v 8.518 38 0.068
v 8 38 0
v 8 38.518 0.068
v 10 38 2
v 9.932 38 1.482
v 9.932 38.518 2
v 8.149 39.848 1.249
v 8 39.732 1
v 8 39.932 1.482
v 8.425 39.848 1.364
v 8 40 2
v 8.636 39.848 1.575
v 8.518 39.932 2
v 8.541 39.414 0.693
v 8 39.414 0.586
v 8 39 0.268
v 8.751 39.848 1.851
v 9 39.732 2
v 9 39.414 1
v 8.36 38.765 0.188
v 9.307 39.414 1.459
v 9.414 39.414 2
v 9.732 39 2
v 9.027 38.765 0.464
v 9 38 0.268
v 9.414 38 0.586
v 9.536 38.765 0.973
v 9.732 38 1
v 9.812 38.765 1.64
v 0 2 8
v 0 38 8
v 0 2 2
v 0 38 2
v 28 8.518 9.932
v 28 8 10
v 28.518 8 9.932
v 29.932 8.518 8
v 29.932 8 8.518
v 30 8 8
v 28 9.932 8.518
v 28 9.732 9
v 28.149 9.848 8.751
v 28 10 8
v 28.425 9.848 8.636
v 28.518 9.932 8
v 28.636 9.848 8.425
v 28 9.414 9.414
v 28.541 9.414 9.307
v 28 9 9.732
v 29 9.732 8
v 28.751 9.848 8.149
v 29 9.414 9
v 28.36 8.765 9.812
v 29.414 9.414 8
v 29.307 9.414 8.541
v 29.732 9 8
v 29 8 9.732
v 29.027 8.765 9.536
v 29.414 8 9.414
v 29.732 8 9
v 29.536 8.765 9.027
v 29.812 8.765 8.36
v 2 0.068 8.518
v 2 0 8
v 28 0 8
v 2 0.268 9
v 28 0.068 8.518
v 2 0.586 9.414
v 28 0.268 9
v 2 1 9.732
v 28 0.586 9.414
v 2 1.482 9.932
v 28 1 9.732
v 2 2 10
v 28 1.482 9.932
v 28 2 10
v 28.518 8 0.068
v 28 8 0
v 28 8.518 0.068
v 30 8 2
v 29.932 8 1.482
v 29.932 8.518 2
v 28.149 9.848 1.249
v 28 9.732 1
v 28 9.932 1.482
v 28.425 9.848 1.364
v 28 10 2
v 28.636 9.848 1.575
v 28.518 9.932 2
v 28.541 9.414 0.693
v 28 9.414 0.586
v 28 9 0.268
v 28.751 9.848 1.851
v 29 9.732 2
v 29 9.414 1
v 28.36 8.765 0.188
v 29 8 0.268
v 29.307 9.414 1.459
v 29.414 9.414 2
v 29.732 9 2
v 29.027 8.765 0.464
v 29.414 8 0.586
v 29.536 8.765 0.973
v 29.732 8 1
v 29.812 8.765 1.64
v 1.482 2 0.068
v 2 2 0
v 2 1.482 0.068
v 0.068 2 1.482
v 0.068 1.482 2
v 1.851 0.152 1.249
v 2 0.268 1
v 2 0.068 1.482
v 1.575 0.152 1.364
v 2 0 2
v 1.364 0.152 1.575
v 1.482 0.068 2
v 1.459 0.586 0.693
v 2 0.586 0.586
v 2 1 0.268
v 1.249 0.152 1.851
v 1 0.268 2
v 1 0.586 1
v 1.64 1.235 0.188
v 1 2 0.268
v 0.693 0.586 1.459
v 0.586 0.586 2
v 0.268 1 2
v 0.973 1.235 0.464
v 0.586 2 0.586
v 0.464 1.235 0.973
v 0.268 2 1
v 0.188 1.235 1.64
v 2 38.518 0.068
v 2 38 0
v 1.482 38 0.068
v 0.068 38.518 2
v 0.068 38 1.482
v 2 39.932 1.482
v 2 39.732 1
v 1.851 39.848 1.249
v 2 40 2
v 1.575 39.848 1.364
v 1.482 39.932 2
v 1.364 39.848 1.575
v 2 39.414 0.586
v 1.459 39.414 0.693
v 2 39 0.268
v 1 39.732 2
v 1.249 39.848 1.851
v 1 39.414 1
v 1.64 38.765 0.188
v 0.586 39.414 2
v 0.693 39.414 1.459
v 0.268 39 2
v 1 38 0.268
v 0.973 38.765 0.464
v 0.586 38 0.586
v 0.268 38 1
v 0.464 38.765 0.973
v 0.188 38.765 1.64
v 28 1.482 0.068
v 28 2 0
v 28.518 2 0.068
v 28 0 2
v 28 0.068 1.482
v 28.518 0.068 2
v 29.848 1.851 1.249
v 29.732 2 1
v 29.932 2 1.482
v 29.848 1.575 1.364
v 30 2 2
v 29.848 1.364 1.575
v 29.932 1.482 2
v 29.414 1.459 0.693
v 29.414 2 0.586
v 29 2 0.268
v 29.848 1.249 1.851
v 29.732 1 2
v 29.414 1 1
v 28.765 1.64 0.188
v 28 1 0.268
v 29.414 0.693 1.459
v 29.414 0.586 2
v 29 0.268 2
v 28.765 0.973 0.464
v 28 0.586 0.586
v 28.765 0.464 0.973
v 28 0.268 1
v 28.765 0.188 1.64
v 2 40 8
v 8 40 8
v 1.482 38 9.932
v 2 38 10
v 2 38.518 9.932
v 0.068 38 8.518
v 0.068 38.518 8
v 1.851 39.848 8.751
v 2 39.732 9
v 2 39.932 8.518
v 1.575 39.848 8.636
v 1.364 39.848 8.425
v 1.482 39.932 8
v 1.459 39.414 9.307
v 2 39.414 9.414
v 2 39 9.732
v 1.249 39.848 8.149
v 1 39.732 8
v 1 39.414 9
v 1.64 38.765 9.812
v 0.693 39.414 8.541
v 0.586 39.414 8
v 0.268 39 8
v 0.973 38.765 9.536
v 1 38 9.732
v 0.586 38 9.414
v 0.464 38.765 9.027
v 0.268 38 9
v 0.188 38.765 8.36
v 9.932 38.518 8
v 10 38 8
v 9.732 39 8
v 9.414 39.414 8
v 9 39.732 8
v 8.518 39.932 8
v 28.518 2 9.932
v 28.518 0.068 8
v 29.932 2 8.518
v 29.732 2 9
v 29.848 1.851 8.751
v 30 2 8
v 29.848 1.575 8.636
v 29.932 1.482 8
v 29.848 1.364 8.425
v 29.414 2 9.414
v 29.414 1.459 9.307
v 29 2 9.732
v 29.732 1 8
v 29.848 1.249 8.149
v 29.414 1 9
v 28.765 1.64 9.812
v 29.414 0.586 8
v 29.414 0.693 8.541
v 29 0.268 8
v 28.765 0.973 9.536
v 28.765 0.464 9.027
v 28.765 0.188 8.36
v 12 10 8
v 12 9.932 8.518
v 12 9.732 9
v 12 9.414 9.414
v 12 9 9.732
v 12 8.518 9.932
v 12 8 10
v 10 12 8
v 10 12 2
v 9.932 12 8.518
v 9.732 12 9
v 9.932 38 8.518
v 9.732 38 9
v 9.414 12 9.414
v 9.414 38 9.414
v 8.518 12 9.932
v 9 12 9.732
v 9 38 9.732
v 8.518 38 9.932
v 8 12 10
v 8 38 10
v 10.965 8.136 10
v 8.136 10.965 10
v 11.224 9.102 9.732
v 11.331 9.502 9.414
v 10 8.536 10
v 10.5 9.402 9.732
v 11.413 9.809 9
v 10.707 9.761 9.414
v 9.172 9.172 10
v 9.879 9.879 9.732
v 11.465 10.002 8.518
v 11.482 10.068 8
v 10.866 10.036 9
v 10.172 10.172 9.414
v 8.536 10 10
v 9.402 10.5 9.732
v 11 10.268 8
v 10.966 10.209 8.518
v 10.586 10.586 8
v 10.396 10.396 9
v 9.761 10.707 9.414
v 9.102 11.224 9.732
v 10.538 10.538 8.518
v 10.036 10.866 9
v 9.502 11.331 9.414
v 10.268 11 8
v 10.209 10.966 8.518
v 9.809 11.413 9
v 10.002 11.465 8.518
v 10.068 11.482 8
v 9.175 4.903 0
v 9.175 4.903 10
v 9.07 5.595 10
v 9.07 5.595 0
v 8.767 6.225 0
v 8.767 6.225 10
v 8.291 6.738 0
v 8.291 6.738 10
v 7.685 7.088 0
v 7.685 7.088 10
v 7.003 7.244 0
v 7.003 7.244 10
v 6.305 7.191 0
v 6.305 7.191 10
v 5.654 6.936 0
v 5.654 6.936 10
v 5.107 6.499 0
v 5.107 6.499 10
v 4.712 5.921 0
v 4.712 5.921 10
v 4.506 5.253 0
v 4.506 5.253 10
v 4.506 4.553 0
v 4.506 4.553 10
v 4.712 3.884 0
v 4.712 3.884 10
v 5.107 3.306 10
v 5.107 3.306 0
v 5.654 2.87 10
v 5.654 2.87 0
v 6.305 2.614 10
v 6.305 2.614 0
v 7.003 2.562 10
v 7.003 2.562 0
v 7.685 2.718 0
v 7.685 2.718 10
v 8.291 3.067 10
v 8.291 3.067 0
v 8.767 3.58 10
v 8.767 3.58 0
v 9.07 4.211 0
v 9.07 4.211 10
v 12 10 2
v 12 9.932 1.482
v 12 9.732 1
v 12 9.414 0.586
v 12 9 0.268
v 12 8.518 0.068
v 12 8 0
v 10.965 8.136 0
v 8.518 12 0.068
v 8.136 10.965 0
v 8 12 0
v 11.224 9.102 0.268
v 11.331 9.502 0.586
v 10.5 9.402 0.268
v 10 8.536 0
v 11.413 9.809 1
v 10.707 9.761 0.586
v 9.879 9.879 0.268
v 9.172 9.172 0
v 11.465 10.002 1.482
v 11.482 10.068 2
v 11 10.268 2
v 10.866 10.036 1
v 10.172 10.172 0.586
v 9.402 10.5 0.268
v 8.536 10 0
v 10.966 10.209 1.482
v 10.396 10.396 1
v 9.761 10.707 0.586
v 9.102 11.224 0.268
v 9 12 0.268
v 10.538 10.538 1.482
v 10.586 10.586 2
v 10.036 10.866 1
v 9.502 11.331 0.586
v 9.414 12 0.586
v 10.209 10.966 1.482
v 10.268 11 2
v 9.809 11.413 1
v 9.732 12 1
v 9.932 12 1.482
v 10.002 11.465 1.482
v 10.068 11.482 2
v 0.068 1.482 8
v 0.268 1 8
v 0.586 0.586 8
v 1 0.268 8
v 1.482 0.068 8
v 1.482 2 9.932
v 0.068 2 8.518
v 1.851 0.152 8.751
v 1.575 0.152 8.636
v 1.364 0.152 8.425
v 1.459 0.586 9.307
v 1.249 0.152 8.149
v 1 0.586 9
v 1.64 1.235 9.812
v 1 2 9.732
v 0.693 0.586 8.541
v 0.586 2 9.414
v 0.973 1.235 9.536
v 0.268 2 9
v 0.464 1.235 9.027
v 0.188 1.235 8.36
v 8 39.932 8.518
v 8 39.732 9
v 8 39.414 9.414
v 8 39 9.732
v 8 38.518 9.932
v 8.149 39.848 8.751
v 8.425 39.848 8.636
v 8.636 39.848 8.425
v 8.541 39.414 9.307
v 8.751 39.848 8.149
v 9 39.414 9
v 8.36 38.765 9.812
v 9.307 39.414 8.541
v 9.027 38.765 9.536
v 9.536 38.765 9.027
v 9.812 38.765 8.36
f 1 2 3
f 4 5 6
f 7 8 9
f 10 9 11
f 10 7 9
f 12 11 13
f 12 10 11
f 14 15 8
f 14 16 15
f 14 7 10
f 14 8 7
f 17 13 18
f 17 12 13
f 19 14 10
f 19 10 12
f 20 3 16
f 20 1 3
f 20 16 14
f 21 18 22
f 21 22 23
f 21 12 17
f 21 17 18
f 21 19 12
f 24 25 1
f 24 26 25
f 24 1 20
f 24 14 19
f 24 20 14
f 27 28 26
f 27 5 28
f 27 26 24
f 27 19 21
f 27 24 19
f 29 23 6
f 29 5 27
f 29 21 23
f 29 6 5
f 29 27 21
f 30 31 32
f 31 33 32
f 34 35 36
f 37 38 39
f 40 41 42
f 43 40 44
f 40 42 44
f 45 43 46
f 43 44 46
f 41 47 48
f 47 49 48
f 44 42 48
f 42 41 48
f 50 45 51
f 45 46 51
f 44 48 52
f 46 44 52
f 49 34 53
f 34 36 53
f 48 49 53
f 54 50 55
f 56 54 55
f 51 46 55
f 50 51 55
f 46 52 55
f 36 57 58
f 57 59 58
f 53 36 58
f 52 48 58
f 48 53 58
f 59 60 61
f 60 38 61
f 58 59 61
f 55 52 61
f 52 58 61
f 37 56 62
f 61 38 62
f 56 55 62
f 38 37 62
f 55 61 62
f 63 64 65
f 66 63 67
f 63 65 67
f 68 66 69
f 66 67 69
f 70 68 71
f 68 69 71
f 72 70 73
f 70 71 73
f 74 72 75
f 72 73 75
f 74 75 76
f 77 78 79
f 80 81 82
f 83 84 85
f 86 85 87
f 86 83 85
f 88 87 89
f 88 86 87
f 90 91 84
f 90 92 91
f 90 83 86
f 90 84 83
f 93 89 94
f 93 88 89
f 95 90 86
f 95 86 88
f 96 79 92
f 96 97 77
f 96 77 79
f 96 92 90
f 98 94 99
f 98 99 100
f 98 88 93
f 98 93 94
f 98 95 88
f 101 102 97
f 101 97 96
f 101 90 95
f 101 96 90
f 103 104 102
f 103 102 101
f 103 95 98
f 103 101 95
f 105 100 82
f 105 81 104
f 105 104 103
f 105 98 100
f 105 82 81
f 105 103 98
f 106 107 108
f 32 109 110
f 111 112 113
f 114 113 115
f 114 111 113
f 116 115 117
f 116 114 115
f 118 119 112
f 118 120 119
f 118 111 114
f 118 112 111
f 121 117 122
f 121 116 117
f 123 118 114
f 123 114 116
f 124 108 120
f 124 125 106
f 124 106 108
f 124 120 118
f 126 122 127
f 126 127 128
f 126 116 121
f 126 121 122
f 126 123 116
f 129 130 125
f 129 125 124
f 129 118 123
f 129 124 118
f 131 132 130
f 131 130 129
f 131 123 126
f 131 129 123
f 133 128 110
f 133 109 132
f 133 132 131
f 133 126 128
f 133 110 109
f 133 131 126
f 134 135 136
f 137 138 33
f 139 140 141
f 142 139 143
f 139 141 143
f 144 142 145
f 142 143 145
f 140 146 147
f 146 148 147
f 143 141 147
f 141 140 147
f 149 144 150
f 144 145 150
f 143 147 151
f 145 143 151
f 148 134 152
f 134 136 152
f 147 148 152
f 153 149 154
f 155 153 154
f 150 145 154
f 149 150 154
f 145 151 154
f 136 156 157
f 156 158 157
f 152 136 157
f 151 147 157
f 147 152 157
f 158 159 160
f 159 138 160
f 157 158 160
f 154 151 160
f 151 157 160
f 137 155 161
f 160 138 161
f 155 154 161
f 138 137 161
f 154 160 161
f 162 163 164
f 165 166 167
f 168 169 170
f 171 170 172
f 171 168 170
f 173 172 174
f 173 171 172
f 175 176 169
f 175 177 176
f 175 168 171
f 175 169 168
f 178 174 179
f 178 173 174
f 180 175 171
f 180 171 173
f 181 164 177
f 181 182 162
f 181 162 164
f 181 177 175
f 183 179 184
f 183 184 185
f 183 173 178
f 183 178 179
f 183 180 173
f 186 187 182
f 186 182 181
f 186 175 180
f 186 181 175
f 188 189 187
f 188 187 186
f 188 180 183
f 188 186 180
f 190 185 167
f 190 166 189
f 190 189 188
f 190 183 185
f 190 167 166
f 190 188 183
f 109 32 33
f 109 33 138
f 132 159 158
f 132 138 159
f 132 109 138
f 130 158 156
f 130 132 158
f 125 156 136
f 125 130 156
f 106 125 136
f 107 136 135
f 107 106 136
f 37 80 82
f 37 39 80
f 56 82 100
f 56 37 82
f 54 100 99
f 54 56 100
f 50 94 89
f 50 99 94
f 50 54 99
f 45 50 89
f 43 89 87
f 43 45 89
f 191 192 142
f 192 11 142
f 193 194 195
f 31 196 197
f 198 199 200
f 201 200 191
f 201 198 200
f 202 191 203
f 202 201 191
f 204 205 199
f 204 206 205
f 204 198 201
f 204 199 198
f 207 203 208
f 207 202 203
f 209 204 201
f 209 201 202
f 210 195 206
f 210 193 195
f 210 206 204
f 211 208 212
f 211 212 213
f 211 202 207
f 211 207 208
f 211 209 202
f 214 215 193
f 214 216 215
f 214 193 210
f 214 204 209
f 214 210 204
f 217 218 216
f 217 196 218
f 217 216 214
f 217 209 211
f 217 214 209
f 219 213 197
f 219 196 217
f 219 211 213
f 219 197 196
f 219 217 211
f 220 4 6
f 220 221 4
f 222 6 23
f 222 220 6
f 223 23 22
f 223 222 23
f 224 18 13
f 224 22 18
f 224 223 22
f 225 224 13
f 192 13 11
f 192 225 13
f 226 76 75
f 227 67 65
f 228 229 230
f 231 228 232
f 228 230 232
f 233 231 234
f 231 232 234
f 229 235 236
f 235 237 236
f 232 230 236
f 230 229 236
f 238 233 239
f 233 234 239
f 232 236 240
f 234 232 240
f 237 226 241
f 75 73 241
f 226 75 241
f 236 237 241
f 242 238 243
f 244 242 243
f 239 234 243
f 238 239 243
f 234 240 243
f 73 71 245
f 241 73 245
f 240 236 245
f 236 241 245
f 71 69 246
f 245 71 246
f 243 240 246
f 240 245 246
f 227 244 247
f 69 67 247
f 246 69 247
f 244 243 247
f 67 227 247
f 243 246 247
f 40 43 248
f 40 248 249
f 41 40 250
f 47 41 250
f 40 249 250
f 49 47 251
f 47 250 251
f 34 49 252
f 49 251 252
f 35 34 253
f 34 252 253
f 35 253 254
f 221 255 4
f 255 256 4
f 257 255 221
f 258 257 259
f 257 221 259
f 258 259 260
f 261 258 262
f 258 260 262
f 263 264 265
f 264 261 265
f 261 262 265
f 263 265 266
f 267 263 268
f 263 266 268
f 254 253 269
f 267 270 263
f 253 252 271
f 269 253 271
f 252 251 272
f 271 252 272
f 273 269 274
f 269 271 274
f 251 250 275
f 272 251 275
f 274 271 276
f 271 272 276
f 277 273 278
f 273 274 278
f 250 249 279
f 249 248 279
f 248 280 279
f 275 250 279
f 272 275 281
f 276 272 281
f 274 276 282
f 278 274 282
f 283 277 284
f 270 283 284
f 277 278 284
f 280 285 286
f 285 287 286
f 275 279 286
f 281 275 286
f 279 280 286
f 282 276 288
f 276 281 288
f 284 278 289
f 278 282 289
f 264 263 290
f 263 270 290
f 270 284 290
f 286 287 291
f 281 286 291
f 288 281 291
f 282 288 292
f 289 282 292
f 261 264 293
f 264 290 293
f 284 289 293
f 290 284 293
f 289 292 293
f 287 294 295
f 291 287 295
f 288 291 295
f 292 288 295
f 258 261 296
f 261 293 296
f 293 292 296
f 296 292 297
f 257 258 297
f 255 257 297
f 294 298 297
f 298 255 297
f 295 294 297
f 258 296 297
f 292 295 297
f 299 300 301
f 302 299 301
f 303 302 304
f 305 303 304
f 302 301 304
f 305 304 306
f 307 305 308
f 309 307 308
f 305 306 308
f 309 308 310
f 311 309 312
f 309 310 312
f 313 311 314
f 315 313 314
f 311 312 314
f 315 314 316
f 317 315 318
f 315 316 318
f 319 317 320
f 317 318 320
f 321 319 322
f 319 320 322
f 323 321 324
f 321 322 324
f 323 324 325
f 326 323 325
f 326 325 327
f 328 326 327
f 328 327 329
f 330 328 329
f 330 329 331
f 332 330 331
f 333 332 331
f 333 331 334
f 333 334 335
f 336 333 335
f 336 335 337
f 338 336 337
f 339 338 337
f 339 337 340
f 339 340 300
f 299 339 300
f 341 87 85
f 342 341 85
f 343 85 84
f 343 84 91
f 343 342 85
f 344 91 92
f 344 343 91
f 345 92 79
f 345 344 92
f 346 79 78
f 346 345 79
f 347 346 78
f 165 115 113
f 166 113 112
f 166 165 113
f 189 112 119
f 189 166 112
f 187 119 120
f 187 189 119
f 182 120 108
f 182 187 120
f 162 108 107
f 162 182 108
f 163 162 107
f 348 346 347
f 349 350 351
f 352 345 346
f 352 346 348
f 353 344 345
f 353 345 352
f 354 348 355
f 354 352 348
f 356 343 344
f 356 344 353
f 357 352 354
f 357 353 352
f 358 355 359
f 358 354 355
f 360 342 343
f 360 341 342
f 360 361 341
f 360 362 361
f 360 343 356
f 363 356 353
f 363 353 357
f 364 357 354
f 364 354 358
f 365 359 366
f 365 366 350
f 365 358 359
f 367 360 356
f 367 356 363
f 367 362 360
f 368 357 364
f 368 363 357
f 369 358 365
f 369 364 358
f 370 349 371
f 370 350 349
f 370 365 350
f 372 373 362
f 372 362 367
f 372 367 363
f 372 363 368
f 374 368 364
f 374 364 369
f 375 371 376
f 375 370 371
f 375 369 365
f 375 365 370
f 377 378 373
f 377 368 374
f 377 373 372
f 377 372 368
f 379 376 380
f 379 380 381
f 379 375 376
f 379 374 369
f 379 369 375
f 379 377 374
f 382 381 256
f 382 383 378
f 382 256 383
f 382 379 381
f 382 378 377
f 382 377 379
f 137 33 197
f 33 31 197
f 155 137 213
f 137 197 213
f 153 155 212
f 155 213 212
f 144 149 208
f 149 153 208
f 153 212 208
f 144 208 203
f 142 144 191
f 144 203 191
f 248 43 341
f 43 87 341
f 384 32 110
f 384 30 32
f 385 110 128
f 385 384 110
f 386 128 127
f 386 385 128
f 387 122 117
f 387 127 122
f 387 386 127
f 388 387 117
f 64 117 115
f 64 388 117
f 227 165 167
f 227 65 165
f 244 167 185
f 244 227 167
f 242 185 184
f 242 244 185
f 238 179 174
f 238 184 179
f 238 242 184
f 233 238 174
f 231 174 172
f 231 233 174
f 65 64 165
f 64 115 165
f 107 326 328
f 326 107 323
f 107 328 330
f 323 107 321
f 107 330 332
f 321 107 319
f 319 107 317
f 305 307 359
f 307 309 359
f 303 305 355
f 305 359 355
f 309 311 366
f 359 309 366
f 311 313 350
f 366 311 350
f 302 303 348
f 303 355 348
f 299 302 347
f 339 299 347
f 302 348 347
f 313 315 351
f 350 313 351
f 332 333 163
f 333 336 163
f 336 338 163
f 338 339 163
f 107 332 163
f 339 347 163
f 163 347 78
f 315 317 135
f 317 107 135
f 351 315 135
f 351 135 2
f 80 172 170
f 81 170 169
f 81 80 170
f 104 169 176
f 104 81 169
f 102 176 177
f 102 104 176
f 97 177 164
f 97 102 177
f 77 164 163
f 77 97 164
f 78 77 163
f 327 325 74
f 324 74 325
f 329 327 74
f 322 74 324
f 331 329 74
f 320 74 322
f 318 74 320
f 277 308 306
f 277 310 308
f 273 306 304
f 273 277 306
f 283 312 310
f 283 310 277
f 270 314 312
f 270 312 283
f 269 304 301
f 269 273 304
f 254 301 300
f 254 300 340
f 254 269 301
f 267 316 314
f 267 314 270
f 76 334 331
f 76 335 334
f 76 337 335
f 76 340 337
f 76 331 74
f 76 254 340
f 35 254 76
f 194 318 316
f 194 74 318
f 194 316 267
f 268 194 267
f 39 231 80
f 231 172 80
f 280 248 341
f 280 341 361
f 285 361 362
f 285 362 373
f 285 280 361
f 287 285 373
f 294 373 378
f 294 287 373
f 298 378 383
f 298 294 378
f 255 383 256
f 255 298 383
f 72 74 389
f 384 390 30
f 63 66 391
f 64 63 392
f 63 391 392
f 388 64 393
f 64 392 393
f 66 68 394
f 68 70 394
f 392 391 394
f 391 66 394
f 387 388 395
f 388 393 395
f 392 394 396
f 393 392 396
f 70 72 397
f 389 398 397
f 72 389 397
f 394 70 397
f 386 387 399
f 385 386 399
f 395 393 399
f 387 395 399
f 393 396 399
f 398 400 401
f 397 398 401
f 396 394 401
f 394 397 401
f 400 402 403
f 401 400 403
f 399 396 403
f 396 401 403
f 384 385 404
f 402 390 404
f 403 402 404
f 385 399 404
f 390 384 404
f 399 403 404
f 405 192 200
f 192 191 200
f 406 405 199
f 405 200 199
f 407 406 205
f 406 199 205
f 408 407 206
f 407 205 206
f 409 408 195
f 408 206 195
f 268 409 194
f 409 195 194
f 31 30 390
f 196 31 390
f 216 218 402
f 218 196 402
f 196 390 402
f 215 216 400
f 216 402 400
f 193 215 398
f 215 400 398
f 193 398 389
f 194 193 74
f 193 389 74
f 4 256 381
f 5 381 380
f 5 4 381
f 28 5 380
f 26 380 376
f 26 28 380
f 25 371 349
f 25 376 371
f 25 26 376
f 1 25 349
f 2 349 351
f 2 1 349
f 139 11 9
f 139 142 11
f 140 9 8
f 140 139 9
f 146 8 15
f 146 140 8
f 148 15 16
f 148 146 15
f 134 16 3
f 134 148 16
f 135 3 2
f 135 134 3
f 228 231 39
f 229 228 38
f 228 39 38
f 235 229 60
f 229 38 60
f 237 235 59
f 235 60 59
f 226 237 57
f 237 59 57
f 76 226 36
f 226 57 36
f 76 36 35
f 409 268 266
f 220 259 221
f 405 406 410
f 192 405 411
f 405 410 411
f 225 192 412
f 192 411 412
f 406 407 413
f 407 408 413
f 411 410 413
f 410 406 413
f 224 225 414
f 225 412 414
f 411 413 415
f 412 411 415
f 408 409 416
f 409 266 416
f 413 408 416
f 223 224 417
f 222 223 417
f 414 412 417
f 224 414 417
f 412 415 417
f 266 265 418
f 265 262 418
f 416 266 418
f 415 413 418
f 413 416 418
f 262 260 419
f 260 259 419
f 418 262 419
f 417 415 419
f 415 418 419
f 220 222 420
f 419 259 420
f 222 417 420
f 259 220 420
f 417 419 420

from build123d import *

# Parameters (mm, degrees)
F1_DEPTH = 10
F2_R     = 2
F3_R     = 2.3474
F4_DEPTH = 25


with BuildPart() as f1:
    # F0 (on Top) → F1 (new body)
    with BuildSketch(Plane.XY):
        Polygon((0, 40), (0, 0), (30, 0), (30, 10), (10, 10), (10, 40), align=None)
    extrude(amount=F1_DEPTH)

    # F2
    f2_edges = [f1.edges().sort_by_distance(p)[0] for p in [
        (0, 20, 10),
        (15, 0, 10),
        (30, 5, 10),
        (20, 10, 10),
        (10, 25, 10),
        (5, 40, 10),
        (0, 20, 0),
        (15, 0, 0),
        (30, 5, 0),
        (20, 10, 0),
        (10, 25, 0),
        (5, 40, 0),
        (10, 40, 5),
        (0, 40, 5),
        (10, 10, 5),
        (30, 10, 5),
        (0, 0, 5),
        (30, 0, 5),
    ]]
    fillet(f2_edges, radius=F2_R)

    # F3 (on face) → F4 (cut)
    with BuildSketch(Plane.XY.offset(10)):
        with Locations((6.827323, 4.902695)):
            Circle(F3_R)
    extrude(amount=-F4_DEPTH, mode=Mode.SUBTRACT)


solid = f1.part
